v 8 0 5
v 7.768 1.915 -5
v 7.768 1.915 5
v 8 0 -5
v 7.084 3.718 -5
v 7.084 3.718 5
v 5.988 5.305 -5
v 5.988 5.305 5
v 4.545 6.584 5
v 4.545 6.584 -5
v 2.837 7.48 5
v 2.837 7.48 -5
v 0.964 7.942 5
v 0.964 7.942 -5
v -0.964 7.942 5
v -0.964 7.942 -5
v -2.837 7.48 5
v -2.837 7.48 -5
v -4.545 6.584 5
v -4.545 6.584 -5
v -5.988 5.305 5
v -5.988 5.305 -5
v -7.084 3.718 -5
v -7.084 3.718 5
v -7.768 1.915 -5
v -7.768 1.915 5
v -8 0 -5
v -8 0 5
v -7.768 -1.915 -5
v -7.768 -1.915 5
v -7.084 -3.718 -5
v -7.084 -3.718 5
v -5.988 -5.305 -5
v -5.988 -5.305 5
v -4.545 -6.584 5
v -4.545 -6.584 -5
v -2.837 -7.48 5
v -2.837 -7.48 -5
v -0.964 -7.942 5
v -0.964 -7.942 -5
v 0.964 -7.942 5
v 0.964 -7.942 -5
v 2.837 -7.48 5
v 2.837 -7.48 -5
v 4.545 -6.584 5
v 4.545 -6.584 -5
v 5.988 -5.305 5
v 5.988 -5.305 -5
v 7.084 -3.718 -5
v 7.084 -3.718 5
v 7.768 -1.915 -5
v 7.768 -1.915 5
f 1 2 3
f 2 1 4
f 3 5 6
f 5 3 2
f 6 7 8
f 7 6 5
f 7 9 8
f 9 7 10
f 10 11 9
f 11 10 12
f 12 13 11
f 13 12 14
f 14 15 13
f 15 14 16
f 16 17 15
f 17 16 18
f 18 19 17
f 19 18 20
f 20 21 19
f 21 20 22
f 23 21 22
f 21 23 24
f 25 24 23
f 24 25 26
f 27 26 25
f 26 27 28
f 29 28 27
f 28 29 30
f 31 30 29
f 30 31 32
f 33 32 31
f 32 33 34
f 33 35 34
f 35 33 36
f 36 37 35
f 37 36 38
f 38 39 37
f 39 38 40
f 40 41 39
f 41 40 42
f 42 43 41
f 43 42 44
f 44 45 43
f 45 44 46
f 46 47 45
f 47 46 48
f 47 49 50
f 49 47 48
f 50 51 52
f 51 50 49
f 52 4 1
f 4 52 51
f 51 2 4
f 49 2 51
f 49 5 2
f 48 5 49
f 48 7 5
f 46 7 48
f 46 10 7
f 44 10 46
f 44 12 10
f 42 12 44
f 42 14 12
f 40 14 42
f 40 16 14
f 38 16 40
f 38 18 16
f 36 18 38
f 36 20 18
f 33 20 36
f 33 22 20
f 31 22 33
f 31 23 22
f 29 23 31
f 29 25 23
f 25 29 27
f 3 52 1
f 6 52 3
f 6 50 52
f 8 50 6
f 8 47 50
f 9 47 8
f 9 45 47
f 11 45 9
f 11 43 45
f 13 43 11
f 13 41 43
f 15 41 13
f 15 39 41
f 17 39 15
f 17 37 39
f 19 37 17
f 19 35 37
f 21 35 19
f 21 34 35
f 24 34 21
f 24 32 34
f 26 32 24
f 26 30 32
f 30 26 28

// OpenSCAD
theta = 60;

module rhomb(side){
    lados = [[0,0],[side,0],[side + side*cos(theta), side*sin(theta)],[side*cos(theta), side*sin(theta)]];
    polygon(points=lados,convexity = 1);
}
 

module  rhomboid(sd,he){
    color([0,1,0])
    linear_extrude(height = he, center = false, convexity = 10, twist = 0, scale = 1.0) rhomb(sd);
}
*rhomboid(5,10);
h11 = 10;
h22 = 7;
re = 8;
ri = 6;

cylinder(h = h11, r1 = re, r2 = re, center = true);
